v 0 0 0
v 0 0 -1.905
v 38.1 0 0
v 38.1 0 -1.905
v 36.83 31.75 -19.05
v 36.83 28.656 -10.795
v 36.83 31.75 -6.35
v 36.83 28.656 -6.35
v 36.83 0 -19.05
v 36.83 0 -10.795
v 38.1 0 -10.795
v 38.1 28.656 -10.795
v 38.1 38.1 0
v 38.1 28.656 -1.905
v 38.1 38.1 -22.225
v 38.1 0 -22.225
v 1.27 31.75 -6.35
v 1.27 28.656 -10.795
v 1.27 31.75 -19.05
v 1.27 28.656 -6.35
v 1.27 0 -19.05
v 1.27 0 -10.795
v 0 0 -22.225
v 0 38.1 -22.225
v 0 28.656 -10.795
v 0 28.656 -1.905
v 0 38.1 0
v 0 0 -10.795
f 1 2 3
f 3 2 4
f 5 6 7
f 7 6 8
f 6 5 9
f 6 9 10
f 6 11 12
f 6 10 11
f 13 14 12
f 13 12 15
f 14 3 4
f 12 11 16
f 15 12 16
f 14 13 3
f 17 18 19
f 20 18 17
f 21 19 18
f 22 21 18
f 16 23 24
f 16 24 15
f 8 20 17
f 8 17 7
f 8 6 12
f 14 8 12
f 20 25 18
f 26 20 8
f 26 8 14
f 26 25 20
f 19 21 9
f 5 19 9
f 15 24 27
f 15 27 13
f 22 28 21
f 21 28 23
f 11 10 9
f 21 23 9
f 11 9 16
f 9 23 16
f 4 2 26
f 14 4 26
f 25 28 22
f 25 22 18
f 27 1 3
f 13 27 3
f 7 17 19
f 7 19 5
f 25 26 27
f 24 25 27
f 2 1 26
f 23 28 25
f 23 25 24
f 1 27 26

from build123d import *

# Parameters (mm, degrees)
SKETCH1_W           = 38.1
SKETCH1_H           = 22.225
BOSS_EXTRUDE2_DEPTH = 38.1
SKETCH4_W           = 35.56
SKETCH4_H           = 12.7
CUT_EXTRUDE1_DEPTH  = 31.75
SKETCH5_W           = 8.89
SKETCH5_H           = 29.21
CUT_EXTRUDE3_DEPTH  = 59.285252208


with BuildPart() as part:
    # Sketch1 → Boss-Extrude2 (new body)
    with BuildSketch(Plane(origin=(0, 0, 0), x_dir=(1, 0, 0), z_dir=(0, 1, 0))):
        with Locations((19.05, 11.1125)):
            Rectangle(SKETCH1_W, SKETCH1_H)
    extrude(amount=BOSS_EXTRUDE2_DEPTH)

    # Sketch4 → Cut-Extrude1 (cut)
    with BuildSketch(Plane.XZ):
        with Locations((19.05, -12.7)):
            Rectangle(SKETCH4_W, SKETCH4_H)
    extrude(amount=-CUT_EXTRUDE1_DEPTH, mode=Mode.SUBTRACT)

    # Sketch5 → Cut-Extrude3 (cut, through all)
    with BuildSketch(Plane.ZY):
        with Locations((-6.350275286, 14.051077043)):
            Rectangle(SKETCH5_W, SKETCH5_H)
    extrude(amount=-CUT_EXTRUDE3_DEPTH, mode=Mode.SUBTRACT)


solid = part.part
